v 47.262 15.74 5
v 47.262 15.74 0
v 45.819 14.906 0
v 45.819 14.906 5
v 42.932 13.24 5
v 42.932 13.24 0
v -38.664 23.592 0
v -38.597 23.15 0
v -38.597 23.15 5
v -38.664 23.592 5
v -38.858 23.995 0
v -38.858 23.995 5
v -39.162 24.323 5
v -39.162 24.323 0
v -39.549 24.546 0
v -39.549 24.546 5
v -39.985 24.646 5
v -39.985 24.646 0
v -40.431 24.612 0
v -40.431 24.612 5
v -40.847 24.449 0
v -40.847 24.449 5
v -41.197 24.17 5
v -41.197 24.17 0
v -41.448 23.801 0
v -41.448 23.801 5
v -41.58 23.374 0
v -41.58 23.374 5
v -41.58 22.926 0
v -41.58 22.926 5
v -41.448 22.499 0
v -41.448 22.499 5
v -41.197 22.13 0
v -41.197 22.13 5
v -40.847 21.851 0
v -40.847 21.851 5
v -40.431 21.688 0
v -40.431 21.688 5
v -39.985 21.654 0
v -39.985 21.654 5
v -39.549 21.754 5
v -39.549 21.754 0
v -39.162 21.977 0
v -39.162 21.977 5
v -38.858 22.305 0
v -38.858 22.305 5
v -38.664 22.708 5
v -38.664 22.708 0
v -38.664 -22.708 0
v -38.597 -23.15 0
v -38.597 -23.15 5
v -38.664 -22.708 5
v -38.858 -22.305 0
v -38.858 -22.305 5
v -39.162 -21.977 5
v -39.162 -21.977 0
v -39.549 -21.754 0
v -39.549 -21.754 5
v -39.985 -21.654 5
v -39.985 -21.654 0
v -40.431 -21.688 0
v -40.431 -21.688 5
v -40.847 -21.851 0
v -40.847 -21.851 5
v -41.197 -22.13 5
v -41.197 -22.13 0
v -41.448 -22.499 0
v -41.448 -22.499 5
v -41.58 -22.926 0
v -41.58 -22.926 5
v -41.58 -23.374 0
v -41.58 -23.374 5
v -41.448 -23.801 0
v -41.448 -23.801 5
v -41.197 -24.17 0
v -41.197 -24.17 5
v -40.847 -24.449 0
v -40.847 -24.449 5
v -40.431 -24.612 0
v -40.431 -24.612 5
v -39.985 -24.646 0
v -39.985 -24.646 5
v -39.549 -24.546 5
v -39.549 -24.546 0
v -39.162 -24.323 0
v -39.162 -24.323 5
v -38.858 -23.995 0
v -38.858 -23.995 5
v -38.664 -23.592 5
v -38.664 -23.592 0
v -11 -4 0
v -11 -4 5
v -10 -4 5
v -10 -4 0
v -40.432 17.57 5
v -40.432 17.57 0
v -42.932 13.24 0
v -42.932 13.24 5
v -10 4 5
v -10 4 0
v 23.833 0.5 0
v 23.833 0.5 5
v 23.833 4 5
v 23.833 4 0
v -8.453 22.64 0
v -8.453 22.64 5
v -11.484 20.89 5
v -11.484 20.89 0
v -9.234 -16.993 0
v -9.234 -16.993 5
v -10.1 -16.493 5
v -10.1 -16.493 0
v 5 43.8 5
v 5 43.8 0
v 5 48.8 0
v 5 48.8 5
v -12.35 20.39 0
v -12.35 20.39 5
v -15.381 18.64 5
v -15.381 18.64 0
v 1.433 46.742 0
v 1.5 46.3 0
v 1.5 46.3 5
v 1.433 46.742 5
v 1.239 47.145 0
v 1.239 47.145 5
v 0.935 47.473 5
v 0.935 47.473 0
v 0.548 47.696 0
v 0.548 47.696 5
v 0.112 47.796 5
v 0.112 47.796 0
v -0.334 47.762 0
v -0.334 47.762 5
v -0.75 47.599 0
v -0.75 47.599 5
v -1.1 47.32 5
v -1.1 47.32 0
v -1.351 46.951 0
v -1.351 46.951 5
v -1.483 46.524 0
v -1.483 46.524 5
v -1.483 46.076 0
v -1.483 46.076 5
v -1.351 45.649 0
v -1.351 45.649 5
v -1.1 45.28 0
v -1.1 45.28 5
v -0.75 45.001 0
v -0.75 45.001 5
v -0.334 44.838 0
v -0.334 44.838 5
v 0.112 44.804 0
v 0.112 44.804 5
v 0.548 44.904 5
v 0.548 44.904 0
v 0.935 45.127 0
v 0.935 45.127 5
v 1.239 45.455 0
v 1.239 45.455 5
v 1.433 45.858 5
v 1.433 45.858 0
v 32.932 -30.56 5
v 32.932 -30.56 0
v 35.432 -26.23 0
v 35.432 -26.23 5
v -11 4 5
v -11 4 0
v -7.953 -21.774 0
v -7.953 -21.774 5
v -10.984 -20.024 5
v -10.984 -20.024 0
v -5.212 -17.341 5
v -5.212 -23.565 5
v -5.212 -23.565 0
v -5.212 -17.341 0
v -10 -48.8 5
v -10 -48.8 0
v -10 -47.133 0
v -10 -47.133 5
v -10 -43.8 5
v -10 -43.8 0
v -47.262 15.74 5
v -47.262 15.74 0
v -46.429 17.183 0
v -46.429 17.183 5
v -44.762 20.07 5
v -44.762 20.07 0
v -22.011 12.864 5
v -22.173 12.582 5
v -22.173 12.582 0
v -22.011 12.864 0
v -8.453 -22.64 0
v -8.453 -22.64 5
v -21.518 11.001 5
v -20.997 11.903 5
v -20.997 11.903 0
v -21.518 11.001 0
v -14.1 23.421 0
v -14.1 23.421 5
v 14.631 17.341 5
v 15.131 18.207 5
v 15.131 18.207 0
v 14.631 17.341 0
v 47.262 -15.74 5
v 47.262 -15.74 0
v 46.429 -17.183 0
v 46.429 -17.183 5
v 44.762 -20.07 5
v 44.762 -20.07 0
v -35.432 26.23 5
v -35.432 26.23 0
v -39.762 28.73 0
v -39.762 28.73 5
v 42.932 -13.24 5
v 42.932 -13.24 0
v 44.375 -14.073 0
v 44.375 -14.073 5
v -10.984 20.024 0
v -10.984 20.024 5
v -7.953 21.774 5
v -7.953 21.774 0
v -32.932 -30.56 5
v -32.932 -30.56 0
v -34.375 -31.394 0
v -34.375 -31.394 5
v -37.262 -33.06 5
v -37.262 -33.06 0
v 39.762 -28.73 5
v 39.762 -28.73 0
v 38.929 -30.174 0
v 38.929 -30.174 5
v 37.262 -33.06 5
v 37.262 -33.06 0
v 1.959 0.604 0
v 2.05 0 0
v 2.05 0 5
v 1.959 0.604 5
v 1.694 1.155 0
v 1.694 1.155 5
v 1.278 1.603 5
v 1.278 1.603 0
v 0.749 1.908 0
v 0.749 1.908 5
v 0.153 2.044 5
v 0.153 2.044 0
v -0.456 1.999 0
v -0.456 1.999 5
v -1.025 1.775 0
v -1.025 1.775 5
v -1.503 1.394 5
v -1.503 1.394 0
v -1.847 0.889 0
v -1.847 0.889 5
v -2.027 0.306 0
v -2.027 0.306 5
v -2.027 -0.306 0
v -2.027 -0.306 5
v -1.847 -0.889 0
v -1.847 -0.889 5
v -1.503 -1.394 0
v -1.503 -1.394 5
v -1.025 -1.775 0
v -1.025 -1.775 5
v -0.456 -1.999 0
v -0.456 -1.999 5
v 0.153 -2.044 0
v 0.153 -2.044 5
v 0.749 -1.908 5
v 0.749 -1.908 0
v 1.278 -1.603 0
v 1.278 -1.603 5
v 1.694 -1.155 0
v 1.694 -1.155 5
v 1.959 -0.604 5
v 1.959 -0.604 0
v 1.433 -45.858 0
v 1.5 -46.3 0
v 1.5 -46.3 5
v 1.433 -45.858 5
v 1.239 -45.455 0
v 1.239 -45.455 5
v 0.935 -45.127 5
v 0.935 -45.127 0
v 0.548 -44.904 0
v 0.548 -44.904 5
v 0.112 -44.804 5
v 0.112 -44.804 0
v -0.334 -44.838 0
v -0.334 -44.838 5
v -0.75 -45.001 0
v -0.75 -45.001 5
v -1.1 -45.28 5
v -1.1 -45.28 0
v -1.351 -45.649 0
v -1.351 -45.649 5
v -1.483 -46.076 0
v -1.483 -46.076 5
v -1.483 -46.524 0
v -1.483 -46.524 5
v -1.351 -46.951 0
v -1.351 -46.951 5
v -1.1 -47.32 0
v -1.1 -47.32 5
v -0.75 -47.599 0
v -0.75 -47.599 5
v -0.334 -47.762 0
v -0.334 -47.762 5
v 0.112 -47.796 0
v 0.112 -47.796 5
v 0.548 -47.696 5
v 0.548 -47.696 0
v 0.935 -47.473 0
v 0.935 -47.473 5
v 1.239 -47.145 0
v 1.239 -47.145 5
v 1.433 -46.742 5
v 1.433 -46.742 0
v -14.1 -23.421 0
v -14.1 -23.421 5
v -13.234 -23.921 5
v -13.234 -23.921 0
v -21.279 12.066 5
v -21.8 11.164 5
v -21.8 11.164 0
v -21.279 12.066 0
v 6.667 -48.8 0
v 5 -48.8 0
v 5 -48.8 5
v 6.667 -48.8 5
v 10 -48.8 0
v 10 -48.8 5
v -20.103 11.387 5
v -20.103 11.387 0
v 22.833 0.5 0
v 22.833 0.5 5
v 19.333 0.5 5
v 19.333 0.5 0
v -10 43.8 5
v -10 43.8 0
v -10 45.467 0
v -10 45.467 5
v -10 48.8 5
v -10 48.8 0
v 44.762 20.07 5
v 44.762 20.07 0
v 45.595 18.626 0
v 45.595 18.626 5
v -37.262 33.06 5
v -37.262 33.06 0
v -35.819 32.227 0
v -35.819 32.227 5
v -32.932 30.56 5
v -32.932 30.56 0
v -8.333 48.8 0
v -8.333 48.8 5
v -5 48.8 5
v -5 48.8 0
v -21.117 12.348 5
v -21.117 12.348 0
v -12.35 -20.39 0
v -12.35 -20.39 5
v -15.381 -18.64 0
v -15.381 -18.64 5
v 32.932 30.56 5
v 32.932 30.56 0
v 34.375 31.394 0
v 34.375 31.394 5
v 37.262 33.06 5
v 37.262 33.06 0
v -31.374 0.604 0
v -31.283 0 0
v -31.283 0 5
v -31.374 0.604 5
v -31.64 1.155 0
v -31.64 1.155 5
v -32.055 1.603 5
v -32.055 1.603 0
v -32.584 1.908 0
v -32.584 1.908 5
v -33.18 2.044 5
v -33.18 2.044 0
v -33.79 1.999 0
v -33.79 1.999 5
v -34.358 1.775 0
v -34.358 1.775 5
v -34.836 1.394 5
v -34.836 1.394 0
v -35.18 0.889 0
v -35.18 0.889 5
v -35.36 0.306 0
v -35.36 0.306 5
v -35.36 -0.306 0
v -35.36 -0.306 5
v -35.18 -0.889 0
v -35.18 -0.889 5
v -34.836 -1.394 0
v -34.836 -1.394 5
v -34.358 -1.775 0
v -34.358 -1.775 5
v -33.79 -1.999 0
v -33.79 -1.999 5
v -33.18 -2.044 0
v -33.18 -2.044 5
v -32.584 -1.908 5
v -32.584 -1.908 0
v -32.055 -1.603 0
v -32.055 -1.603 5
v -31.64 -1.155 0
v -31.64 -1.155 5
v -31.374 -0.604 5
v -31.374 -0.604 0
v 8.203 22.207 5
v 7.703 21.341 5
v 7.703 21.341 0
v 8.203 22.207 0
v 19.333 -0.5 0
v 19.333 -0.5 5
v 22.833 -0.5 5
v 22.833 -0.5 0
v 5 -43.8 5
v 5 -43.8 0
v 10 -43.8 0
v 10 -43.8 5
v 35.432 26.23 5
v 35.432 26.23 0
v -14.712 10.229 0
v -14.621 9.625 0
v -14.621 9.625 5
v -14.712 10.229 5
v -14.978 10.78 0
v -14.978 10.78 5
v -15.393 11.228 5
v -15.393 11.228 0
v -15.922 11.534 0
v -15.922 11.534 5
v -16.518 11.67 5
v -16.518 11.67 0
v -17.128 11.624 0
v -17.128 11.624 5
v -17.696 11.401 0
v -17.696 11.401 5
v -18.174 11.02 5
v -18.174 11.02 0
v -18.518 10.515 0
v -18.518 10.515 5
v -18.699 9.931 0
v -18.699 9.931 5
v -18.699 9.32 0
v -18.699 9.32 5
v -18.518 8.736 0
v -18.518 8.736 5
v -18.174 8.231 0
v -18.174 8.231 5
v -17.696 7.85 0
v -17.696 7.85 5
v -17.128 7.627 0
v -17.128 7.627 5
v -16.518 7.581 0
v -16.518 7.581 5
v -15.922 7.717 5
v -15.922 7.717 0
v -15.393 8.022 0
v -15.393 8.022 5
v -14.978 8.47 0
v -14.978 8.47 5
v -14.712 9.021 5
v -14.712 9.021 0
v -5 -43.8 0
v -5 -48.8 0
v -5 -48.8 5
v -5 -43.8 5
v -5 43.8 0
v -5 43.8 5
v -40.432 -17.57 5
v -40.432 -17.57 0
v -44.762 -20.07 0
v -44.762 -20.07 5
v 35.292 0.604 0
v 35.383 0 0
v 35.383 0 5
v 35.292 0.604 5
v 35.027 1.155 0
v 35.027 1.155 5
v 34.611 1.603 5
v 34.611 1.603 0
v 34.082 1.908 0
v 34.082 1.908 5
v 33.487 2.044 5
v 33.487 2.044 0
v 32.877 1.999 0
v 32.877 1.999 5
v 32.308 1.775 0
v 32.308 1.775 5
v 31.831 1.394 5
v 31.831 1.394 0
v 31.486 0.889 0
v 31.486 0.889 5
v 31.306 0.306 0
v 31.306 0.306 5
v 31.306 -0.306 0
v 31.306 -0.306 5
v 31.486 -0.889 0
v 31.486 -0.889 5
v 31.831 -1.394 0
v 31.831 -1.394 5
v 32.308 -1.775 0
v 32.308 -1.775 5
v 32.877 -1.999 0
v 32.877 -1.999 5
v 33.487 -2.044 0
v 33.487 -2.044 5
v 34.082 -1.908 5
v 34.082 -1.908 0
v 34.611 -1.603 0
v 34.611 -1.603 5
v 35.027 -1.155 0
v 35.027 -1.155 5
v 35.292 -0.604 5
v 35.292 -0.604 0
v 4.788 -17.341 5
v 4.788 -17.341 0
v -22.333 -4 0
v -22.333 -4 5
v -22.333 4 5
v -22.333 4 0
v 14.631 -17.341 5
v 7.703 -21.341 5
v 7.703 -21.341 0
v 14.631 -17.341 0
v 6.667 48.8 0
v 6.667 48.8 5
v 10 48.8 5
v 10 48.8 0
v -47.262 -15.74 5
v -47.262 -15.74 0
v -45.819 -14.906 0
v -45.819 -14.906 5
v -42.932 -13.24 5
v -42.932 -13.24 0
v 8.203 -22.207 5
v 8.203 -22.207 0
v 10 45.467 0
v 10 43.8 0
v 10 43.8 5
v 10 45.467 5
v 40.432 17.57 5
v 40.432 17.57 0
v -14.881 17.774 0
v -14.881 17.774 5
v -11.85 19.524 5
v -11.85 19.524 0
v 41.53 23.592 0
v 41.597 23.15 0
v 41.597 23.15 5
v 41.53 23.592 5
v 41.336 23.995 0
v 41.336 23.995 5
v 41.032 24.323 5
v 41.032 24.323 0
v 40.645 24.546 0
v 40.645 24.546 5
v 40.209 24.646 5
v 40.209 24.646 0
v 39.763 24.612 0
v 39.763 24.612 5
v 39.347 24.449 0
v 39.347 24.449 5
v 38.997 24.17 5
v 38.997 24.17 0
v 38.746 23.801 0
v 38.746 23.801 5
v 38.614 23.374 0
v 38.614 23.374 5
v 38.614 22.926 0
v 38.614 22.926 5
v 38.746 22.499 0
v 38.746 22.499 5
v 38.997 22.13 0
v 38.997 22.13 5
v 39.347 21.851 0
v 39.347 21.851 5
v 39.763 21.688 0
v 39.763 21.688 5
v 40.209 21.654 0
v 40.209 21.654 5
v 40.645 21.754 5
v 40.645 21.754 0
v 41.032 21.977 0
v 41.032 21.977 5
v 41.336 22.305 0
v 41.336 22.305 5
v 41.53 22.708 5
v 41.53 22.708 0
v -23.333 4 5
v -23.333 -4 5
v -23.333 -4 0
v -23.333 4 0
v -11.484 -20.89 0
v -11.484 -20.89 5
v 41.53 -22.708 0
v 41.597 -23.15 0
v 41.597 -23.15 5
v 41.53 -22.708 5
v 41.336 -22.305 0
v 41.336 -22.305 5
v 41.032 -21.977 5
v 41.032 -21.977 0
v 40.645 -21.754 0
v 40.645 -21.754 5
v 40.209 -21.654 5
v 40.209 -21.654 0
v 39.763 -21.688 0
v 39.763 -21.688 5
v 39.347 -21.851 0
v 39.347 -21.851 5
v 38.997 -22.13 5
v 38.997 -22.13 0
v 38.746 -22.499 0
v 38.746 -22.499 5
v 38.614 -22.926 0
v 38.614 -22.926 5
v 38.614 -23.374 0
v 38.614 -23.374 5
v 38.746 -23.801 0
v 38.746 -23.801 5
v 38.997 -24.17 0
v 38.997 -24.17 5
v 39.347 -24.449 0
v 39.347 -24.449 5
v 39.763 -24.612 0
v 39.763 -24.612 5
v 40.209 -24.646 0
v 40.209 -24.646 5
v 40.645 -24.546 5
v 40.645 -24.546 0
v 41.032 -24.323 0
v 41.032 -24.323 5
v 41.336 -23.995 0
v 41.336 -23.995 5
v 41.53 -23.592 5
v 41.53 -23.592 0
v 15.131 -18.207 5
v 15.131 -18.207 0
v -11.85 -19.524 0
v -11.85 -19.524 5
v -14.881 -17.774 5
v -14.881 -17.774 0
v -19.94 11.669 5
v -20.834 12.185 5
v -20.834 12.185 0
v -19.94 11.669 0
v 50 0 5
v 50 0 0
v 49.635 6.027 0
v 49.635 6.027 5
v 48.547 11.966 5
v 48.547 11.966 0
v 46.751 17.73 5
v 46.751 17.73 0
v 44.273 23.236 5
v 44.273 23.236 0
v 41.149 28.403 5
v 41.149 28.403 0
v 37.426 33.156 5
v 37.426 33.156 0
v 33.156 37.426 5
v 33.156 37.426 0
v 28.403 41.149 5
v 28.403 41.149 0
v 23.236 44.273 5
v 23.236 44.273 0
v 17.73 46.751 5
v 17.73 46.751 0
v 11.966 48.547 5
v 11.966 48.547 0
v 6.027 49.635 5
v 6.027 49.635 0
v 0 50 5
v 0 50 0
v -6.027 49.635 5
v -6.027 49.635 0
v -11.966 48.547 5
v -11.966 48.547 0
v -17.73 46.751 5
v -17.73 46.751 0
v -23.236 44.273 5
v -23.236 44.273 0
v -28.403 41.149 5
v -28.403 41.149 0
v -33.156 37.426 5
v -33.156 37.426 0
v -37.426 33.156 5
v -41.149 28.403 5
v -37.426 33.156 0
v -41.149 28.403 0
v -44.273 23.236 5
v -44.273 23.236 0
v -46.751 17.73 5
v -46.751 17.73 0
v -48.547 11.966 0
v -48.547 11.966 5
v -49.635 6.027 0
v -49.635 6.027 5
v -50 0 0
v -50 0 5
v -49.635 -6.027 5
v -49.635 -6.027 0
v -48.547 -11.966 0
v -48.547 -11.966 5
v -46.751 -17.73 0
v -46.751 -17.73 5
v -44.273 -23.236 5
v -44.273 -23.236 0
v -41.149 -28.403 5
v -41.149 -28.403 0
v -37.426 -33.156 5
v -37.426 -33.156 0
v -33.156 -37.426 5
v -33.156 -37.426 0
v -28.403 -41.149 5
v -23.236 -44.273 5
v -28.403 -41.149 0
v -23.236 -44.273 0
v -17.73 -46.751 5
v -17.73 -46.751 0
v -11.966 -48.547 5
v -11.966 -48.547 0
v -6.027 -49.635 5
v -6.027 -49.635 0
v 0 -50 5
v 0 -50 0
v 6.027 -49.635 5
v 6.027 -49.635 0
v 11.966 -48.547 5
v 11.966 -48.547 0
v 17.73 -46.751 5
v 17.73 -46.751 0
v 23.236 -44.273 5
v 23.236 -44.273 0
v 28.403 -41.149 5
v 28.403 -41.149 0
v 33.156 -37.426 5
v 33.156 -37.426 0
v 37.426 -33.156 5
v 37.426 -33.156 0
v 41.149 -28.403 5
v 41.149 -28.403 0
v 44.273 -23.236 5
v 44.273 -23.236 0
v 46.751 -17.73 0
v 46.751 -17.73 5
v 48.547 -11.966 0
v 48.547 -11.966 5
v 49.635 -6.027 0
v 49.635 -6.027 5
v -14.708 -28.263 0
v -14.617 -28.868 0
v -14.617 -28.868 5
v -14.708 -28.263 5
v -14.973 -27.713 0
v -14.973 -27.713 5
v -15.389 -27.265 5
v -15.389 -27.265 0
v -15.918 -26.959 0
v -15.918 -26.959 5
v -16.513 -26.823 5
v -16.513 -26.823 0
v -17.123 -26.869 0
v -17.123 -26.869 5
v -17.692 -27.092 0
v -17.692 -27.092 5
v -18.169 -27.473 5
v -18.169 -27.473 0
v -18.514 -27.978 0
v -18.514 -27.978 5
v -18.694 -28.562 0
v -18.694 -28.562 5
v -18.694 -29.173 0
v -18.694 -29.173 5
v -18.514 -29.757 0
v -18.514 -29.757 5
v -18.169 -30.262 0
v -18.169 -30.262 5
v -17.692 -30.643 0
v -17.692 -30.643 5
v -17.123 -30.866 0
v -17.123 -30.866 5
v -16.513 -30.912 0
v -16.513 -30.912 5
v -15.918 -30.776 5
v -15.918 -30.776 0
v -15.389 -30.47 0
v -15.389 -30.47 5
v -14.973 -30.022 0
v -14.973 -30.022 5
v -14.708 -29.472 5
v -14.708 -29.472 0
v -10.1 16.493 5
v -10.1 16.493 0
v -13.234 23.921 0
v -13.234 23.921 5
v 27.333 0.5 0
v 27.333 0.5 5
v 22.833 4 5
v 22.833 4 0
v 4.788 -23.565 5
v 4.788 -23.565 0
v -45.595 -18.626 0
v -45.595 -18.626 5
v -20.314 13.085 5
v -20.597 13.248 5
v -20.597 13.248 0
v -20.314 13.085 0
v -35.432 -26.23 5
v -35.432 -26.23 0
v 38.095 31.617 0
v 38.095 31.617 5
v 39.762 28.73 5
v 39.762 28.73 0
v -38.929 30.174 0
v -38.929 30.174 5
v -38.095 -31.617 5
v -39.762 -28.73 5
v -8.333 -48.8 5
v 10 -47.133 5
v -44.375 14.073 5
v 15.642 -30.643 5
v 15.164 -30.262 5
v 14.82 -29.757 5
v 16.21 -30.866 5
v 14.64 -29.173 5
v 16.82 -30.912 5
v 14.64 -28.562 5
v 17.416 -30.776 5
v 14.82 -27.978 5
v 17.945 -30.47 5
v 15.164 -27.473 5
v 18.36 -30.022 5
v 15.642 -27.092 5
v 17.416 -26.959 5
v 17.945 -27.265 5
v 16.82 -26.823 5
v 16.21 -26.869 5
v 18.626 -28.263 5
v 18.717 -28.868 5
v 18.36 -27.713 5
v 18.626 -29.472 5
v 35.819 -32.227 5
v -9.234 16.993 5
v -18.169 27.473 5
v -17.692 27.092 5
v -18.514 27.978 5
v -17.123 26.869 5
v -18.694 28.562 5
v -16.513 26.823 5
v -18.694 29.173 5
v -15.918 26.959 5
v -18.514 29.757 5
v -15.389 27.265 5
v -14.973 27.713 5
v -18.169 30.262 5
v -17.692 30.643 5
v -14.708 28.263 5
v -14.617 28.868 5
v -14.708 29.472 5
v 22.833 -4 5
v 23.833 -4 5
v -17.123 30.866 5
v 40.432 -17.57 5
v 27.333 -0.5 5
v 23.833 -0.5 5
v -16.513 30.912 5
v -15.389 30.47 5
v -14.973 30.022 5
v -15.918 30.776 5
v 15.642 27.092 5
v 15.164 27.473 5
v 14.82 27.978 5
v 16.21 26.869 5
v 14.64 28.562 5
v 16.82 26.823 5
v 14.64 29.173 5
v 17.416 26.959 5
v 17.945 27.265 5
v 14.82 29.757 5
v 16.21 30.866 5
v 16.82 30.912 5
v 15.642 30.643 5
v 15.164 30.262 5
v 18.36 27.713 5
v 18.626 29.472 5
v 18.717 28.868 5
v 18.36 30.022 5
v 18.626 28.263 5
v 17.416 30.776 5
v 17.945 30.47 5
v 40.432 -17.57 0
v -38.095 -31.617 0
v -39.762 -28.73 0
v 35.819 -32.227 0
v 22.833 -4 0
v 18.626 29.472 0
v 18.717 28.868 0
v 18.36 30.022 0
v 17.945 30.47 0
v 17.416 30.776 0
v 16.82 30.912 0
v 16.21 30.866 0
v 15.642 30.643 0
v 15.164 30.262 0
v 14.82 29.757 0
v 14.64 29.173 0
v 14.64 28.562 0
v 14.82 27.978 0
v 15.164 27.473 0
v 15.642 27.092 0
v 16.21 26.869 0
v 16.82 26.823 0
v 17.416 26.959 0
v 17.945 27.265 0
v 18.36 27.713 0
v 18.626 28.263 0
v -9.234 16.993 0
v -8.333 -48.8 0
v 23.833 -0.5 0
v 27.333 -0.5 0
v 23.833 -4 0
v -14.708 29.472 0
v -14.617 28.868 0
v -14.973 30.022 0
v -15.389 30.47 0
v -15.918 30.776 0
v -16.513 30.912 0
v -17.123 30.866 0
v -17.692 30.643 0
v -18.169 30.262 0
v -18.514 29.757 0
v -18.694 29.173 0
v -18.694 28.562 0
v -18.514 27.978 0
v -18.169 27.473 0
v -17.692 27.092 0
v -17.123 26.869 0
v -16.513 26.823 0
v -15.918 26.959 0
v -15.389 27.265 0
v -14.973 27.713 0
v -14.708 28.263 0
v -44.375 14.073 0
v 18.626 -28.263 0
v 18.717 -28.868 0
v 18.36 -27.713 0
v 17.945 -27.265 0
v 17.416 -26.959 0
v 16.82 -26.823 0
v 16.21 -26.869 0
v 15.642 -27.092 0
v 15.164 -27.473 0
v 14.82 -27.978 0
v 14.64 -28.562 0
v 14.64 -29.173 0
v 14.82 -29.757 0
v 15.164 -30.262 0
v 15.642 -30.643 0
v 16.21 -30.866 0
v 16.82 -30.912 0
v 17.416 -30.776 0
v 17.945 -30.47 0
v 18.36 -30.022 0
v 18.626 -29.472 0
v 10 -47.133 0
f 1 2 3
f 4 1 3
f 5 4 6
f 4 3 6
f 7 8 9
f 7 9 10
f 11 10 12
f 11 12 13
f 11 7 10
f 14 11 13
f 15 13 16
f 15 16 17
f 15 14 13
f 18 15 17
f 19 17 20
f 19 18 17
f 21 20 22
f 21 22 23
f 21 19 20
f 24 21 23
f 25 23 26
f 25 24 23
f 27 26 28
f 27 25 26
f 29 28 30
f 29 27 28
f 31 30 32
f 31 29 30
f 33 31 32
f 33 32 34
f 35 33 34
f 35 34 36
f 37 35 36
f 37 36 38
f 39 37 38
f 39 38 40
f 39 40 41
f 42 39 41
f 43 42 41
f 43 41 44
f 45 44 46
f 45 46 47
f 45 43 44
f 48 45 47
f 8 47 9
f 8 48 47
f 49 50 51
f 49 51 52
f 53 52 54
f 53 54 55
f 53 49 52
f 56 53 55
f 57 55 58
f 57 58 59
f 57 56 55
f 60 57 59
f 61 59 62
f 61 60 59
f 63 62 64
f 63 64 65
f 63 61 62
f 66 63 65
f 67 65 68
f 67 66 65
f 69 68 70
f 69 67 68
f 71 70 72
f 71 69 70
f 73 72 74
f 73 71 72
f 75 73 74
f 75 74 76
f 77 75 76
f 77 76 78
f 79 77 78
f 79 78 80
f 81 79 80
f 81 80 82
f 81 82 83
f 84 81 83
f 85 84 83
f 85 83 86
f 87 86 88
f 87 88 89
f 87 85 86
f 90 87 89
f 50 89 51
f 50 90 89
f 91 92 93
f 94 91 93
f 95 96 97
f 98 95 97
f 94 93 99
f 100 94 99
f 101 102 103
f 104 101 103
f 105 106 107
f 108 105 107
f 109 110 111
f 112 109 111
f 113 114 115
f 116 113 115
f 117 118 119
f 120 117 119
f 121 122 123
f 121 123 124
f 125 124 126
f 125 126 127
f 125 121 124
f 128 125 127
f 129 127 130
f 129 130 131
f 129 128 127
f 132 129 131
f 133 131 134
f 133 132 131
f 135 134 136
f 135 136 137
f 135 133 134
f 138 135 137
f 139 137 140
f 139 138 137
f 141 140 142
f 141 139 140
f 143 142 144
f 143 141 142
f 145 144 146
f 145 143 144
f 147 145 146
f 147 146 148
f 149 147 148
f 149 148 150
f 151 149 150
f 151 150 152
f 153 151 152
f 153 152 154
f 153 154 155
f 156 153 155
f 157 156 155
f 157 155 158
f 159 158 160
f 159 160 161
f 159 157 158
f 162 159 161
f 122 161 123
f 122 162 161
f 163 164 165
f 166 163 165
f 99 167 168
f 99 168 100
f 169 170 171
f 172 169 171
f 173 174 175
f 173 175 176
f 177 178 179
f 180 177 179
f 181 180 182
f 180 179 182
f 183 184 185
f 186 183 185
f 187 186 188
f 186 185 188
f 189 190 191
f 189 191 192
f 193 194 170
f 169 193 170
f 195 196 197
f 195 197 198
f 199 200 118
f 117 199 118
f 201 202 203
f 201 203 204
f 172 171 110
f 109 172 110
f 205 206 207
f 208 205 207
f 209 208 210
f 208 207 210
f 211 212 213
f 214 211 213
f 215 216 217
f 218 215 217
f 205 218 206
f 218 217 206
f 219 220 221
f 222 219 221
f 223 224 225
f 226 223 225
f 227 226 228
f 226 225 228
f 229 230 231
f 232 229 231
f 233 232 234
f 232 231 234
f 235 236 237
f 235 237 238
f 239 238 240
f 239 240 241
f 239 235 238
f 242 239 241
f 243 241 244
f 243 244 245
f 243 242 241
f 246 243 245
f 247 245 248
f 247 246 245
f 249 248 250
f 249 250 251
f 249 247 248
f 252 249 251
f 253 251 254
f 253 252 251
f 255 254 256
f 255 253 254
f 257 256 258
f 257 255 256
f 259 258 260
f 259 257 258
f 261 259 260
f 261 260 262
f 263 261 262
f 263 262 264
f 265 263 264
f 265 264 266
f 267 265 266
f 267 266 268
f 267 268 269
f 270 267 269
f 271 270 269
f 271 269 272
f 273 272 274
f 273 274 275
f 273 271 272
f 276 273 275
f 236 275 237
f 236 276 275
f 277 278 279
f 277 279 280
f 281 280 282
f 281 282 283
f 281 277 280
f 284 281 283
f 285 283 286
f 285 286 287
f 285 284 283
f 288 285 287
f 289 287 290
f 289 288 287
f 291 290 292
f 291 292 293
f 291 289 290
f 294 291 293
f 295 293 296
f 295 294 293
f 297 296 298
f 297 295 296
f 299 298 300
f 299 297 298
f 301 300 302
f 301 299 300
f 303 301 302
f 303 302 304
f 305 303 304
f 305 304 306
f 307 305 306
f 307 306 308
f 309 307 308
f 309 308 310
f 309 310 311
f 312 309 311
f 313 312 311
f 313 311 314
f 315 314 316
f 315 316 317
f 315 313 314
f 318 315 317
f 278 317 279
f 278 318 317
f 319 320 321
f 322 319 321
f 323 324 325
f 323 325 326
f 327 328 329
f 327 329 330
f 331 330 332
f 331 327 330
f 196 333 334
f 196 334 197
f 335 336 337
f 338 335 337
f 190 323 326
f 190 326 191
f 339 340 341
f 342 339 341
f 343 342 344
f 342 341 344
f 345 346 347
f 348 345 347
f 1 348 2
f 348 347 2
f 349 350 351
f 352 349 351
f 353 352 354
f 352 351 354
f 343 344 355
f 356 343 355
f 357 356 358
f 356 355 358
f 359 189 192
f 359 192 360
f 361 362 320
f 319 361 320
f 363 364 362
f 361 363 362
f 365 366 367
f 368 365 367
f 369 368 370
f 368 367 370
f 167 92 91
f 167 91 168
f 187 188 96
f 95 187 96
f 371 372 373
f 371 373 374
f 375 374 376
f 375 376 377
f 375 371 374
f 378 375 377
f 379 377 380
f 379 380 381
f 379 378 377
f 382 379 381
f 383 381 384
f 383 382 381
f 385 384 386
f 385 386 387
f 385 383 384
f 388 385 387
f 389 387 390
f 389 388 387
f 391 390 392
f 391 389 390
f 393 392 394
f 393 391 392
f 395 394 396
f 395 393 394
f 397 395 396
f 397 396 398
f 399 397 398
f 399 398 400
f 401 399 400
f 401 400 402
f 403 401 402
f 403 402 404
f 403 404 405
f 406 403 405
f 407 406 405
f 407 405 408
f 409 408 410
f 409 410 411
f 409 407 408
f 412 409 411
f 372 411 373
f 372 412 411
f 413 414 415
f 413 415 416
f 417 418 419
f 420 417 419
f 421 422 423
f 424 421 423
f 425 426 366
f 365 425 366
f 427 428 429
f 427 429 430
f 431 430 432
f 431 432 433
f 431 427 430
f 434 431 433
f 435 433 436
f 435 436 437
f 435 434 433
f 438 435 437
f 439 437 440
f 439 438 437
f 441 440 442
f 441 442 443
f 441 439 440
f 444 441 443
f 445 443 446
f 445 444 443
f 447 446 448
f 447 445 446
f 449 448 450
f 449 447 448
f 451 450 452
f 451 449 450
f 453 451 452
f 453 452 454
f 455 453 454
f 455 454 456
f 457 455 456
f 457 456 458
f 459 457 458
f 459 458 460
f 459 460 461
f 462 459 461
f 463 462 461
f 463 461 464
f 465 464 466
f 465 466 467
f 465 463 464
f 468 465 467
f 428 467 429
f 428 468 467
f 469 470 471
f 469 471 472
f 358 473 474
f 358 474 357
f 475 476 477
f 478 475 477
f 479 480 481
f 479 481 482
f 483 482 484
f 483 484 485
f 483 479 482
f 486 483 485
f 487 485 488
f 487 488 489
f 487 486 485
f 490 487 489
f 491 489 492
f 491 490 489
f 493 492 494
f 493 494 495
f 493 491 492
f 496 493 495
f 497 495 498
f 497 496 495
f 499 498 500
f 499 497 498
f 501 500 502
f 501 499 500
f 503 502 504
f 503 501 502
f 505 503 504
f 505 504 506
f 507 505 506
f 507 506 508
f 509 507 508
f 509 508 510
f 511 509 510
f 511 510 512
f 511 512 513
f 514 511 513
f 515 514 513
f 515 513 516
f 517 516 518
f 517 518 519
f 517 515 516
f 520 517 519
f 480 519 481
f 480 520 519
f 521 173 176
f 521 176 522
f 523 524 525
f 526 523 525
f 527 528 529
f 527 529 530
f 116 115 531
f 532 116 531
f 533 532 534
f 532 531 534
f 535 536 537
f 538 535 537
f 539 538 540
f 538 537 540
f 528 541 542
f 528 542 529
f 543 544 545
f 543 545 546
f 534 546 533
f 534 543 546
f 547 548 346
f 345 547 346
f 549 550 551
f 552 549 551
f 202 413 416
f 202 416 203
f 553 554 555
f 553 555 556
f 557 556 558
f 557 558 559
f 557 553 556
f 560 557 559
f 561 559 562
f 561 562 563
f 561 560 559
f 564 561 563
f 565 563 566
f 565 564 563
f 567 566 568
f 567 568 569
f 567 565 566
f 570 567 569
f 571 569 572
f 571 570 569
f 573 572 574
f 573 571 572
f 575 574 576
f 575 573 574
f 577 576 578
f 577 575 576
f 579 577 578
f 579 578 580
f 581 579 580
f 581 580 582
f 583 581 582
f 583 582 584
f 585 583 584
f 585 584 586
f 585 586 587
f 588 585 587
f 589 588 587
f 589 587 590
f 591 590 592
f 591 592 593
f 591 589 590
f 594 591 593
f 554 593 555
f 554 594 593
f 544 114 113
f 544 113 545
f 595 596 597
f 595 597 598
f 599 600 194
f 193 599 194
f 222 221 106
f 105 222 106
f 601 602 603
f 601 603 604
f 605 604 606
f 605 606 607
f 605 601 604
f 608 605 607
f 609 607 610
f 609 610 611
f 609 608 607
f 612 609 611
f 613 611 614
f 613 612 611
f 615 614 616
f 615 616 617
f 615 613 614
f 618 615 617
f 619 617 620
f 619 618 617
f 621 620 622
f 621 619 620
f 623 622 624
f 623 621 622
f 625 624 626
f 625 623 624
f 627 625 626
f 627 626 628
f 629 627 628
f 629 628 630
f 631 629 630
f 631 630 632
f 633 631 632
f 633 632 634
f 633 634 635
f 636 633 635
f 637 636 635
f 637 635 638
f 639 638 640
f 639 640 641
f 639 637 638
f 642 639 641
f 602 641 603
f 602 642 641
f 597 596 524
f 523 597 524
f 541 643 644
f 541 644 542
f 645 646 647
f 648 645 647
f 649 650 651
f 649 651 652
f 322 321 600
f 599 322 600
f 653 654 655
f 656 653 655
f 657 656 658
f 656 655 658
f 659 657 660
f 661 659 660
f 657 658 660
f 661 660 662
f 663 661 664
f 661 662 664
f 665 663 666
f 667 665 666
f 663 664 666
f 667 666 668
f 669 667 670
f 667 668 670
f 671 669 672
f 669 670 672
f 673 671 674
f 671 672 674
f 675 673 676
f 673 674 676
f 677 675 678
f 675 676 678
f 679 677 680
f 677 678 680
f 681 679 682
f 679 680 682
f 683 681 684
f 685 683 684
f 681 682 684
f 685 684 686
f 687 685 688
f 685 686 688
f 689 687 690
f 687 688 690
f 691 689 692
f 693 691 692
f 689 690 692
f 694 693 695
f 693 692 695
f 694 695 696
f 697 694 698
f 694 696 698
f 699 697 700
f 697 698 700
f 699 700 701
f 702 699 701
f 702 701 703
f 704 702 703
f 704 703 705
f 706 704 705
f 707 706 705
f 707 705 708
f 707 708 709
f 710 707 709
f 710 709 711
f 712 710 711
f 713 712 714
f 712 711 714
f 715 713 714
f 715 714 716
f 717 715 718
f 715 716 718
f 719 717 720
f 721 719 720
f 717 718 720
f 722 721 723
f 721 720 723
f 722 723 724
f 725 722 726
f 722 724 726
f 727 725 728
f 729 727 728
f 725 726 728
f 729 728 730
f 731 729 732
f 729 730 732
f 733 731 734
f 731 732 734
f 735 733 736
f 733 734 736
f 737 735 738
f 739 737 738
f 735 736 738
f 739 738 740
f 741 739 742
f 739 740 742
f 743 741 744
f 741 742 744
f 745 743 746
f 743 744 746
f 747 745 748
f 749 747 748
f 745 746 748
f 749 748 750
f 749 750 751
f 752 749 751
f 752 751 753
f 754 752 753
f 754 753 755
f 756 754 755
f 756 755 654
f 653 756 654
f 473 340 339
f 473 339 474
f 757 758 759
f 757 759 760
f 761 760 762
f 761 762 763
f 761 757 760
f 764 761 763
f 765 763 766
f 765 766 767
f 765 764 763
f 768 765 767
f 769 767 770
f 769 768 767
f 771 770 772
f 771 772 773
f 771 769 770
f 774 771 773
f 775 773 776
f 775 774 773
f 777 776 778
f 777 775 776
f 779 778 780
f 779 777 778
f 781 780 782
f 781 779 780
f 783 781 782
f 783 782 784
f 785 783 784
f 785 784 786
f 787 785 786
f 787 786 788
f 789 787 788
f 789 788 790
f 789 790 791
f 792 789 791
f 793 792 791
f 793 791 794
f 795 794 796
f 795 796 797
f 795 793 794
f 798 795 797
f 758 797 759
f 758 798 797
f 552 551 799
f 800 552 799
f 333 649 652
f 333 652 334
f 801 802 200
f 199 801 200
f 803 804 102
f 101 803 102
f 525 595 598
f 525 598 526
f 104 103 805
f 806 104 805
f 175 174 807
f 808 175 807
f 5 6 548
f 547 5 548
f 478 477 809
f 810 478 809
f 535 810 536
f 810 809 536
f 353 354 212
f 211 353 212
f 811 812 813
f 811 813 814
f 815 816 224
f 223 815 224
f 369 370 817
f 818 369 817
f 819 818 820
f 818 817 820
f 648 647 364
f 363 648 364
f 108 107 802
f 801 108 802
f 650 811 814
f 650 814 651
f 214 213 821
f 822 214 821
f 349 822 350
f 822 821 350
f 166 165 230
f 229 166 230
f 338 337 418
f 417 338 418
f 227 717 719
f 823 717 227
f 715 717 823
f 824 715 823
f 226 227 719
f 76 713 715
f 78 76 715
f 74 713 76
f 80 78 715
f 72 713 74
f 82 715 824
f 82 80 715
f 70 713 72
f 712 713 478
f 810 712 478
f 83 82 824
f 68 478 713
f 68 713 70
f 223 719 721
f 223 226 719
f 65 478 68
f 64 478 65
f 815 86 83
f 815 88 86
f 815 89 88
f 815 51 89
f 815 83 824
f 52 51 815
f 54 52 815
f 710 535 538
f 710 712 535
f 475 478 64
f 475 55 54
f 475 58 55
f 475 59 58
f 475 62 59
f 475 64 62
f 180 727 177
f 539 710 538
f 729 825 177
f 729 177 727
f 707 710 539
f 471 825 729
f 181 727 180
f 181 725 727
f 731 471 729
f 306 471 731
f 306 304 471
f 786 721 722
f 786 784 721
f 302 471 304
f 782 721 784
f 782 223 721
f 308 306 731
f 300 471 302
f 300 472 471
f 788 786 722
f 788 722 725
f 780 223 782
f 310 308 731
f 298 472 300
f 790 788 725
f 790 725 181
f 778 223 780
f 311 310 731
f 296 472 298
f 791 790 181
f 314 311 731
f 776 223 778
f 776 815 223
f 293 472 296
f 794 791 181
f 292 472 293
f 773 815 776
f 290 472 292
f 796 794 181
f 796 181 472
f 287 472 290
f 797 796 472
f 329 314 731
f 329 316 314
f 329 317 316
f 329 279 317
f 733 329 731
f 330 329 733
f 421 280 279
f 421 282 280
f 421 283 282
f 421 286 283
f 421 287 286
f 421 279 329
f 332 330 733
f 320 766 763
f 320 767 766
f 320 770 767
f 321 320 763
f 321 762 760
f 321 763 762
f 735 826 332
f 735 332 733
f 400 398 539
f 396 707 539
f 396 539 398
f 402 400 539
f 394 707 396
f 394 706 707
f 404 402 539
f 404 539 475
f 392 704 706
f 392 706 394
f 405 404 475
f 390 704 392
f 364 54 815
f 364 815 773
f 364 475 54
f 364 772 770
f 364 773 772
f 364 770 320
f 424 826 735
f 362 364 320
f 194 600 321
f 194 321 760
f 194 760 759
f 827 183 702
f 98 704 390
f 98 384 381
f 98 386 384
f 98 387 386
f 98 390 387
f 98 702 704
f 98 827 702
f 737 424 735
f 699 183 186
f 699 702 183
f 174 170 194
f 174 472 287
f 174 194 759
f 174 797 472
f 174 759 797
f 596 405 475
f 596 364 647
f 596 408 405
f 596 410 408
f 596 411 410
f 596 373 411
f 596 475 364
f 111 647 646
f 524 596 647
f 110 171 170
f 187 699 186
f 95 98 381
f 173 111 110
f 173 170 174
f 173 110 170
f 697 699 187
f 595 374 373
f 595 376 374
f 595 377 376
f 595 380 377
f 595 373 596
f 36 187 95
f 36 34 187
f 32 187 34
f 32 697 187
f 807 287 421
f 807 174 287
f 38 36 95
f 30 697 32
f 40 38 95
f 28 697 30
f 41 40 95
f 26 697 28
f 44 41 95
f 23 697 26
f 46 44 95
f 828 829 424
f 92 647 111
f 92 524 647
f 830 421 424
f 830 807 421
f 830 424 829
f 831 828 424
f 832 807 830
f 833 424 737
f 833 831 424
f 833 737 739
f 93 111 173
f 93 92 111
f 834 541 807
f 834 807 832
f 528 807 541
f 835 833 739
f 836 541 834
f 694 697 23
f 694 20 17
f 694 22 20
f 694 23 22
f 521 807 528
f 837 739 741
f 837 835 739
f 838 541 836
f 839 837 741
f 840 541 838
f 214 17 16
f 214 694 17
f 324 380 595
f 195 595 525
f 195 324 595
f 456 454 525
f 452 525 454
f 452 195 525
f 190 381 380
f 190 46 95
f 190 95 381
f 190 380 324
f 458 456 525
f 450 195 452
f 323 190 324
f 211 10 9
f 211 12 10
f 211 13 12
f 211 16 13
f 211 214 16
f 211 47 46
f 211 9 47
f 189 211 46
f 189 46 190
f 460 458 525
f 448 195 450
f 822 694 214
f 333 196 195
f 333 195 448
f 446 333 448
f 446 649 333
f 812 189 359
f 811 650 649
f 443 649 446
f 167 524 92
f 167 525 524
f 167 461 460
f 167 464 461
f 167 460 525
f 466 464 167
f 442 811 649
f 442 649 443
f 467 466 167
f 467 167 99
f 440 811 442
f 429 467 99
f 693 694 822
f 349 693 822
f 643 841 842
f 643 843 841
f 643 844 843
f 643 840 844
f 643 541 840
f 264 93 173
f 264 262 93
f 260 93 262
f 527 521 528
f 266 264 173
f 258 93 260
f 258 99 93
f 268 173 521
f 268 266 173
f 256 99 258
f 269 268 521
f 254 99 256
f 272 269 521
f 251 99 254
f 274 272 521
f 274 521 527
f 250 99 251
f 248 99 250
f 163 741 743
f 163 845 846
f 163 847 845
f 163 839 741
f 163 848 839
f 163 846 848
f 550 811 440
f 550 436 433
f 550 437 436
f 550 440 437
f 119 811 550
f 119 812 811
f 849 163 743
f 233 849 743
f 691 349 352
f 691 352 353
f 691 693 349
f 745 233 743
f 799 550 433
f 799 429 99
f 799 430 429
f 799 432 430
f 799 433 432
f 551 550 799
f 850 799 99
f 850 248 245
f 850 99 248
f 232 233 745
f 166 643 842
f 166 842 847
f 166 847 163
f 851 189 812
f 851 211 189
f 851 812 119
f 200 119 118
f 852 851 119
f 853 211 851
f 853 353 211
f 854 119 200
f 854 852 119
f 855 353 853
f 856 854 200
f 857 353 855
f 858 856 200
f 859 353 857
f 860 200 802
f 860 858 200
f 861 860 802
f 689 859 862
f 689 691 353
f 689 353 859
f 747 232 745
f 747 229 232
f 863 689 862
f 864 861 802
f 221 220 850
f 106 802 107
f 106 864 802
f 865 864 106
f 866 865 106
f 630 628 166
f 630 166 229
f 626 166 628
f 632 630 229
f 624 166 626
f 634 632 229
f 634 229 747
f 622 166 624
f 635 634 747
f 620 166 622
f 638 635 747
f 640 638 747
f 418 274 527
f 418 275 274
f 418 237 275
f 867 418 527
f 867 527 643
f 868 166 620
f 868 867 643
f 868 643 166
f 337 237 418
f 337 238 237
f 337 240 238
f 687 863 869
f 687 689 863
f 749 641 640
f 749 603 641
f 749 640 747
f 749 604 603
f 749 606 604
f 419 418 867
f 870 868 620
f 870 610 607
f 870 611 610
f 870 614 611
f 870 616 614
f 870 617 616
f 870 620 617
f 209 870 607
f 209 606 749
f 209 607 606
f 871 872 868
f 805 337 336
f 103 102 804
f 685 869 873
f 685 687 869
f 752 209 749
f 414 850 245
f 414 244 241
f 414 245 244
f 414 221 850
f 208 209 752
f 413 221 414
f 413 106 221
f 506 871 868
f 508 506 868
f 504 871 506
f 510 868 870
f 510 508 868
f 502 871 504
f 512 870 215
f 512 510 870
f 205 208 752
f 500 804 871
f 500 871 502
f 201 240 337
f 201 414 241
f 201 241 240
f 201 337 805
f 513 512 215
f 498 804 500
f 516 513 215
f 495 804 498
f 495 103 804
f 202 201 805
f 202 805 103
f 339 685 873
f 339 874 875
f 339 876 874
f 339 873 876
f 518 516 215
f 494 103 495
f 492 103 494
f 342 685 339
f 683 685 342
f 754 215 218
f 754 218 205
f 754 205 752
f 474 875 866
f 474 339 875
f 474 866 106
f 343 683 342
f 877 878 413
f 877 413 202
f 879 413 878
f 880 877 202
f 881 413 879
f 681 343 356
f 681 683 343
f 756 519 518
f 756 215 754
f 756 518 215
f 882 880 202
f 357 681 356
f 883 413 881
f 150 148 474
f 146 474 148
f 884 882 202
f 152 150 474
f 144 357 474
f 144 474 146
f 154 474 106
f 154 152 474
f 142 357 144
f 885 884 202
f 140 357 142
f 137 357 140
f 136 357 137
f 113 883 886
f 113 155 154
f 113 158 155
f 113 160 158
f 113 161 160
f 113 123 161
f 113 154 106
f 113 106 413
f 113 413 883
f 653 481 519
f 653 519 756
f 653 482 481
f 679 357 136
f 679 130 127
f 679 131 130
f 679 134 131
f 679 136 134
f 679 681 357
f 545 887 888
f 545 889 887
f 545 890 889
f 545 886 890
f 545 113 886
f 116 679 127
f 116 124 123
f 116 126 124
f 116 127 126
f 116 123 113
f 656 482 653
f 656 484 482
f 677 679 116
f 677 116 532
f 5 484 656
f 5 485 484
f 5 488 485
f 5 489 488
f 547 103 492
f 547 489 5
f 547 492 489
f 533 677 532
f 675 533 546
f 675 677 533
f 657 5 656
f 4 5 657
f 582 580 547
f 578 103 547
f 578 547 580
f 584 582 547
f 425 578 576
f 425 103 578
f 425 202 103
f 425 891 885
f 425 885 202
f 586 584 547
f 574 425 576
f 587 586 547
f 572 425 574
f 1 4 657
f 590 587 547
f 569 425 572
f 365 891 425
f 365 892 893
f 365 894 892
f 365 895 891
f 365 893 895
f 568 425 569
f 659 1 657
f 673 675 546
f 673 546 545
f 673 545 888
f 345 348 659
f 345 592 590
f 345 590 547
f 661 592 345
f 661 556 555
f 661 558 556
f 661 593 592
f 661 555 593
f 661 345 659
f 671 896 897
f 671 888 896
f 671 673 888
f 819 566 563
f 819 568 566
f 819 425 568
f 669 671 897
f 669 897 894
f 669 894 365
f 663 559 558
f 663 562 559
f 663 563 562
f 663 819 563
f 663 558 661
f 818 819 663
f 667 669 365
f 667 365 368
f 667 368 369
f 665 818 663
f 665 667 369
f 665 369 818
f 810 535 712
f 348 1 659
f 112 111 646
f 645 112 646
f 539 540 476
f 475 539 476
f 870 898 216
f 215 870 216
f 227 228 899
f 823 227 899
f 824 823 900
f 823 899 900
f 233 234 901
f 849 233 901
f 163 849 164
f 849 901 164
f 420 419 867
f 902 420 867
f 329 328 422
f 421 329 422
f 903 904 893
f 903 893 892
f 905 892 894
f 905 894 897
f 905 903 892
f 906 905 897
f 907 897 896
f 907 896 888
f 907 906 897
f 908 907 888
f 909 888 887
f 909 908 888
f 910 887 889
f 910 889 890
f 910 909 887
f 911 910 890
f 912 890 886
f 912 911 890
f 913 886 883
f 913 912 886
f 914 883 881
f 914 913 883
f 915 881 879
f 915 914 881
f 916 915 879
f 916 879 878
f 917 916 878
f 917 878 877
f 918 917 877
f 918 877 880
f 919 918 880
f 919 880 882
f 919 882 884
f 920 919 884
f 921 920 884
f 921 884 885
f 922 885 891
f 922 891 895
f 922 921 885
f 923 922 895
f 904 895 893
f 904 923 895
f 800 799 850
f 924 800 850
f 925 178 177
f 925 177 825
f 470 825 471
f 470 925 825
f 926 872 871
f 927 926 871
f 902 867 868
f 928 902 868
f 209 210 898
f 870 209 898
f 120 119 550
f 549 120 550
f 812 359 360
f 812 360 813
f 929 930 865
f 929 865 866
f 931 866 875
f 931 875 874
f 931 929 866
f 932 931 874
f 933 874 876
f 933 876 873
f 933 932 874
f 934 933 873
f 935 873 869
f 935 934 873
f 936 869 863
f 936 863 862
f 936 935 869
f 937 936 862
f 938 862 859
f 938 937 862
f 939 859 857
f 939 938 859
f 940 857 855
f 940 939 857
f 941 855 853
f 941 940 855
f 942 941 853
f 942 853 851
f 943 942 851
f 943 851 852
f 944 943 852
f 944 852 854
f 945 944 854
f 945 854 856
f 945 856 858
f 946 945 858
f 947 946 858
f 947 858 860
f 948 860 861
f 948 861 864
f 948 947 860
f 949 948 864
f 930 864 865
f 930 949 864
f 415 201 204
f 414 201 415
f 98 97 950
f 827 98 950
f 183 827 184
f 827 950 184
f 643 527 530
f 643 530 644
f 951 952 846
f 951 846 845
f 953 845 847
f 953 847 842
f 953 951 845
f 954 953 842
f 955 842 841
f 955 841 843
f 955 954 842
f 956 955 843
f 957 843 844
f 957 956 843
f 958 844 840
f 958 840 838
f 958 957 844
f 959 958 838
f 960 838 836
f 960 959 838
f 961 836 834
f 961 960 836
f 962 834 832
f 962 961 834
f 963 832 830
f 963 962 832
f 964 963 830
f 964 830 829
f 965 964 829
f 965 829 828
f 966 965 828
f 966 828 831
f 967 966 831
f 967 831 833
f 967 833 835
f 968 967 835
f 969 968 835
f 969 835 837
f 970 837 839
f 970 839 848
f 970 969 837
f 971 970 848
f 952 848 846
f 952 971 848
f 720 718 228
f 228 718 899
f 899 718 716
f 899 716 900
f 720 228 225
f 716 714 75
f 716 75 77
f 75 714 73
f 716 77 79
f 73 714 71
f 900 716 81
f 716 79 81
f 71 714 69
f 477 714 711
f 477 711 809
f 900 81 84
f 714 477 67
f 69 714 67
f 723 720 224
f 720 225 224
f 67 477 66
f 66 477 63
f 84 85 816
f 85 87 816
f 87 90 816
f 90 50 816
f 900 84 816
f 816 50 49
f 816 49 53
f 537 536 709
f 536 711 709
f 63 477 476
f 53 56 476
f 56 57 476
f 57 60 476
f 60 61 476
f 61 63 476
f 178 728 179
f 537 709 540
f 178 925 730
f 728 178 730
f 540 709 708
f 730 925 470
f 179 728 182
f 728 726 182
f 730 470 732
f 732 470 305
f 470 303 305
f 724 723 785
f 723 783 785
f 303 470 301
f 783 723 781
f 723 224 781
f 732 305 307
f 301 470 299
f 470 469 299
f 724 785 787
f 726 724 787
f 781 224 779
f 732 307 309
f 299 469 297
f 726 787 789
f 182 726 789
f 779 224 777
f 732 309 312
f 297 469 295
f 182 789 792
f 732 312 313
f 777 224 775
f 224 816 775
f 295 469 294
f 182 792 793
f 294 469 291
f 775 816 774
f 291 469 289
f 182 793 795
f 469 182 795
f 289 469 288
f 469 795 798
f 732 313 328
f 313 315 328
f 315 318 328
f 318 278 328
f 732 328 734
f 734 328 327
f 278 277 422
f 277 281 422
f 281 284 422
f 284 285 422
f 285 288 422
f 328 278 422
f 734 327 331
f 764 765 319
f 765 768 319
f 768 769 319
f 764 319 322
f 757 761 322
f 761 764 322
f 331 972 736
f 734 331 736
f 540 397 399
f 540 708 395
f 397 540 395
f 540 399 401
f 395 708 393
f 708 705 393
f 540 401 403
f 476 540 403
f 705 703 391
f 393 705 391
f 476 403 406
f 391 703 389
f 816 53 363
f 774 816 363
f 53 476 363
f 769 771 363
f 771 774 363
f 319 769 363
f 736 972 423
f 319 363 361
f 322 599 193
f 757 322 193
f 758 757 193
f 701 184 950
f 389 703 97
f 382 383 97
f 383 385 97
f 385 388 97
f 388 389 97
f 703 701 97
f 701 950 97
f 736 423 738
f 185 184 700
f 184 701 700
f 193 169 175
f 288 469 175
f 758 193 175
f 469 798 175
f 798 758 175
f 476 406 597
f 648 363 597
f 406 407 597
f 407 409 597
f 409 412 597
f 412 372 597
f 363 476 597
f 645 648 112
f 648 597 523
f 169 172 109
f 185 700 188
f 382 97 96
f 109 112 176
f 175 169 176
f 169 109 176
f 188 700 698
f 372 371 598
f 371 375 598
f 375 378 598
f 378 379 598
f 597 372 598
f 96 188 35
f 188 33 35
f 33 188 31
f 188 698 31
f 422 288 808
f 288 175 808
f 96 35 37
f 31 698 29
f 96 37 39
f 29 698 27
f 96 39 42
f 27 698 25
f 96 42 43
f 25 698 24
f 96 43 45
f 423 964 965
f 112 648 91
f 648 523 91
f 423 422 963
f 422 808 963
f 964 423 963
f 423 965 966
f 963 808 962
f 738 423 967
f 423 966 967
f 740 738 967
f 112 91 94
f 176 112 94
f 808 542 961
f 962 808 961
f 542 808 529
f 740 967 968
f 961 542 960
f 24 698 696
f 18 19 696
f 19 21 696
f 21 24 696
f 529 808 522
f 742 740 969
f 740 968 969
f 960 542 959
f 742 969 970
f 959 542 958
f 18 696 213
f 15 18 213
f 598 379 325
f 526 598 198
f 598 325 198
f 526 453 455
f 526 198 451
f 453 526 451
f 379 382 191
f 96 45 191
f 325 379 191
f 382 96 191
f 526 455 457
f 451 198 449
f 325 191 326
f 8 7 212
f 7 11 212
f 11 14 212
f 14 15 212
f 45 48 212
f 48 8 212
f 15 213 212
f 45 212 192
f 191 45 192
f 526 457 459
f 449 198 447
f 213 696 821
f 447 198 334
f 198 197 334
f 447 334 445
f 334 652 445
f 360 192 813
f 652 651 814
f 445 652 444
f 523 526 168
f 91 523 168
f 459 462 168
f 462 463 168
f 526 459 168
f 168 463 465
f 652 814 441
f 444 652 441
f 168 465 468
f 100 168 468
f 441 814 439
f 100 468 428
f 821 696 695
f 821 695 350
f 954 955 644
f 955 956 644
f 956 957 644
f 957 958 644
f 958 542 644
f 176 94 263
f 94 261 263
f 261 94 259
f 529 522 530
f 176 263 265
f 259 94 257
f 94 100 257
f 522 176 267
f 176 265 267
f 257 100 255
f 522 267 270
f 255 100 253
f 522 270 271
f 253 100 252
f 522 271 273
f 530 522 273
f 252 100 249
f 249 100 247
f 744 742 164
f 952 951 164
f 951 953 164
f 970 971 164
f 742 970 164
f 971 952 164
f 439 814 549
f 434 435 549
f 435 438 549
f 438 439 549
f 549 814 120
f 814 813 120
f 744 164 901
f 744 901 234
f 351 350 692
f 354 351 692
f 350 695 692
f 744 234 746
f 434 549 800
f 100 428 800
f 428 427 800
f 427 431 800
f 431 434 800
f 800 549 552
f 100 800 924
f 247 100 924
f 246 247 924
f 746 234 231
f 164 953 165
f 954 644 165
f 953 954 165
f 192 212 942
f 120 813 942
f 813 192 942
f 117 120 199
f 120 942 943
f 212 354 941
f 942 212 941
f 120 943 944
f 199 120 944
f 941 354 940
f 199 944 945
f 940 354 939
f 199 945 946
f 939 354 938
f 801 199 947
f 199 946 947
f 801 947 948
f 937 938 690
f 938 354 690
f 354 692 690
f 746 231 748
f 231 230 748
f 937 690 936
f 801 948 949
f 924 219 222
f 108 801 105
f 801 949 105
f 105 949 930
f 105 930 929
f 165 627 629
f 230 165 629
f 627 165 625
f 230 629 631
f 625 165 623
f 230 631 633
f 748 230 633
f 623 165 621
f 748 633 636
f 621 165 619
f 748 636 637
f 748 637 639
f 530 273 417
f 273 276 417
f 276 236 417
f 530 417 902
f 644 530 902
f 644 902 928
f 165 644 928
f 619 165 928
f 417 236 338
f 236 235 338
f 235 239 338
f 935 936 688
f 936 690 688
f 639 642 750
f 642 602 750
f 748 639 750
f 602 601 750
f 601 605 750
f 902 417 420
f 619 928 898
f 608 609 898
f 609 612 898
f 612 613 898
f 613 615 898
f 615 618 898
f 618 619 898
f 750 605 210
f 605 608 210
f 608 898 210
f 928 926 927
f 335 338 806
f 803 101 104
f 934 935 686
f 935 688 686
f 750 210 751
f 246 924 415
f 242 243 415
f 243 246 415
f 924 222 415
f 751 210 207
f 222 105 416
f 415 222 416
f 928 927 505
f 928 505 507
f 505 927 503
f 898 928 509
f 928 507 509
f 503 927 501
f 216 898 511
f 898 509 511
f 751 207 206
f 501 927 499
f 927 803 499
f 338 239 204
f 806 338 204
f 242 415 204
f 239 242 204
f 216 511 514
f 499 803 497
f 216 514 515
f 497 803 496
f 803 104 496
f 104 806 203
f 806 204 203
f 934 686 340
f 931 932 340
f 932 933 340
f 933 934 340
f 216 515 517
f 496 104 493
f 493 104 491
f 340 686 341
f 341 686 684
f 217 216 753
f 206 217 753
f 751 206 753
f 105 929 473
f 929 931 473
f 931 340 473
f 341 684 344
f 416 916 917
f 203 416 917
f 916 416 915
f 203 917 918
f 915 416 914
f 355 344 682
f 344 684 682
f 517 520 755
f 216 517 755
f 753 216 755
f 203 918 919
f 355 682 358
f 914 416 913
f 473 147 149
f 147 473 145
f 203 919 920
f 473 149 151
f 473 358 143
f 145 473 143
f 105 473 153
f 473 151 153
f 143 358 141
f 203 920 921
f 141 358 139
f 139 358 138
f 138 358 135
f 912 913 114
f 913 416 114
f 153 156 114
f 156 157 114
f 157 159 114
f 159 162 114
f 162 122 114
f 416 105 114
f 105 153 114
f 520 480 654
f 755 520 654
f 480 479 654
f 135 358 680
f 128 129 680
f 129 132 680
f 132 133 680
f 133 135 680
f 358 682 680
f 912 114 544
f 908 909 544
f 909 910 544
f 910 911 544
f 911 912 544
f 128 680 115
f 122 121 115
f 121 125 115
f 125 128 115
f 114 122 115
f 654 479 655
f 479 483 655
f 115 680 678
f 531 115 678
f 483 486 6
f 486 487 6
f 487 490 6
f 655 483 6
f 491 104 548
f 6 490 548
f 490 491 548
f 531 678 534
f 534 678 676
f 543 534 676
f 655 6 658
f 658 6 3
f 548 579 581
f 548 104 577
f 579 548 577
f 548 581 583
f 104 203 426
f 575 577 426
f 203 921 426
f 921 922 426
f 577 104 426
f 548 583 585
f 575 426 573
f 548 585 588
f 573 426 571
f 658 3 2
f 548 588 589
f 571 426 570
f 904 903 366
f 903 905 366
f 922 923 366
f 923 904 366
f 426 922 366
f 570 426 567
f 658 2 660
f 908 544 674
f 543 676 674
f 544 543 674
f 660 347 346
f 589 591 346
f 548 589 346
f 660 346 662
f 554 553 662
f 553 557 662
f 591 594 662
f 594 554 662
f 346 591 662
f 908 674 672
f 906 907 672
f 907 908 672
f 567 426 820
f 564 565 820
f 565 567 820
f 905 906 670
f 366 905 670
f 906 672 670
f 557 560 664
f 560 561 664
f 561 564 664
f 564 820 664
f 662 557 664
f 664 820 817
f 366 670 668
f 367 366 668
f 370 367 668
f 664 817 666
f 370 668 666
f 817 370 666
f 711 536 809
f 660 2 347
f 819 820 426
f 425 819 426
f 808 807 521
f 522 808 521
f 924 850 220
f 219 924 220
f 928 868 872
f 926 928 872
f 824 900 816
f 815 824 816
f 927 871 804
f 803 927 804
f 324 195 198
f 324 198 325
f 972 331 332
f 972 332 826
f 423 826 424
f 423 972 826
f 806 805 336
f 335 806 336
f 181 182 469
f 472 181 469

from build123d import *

# Parameters (mm, degrees)
BOSS_EXTRU_1_OUTLINE_R   = 50
BOSS_EXTRU_1_OUTLINE_W   = 5
BOSS_EXTRU_1_OUTLINE_H   = 5
BOSS_EXTRU_1_OUTLINE_R_2 = 2.05
BOSS_EXTRU_1_OUTLINE_R_3 = 1.5
BOSS_EXTRU_1_DEPTH       = 5
SKETCH3_W                = 1
SKETCH3_H                = 8
SKETCH3_W_2              = 10
SKETCH3_H_2              = 6.223903135
CUT_EXTRUDE2_DEPTH       = 10


# Read off the part's stored shape, not the designer's step: Boss.-Extru.1
with BuildPart() as part:
    # Boss.-Extru.1 outline → Boss.-Extru.1 (new body)
    with BuildSketch(Plane.XY):
        Circle(BOSS_EXTRU_1_OUTLINE_R)
        Polygon((-37.262039705, -33.060254038), (-39.762039705, -28.730127019), (-35.431912686, -26.230127019), (-32.931912686, -30.560254038), align=None, mode=Mode.SUBTRACT)
        with Locations((-7.5, -46.3)):
            Rectangle(BOSS_EXTRU_1_OUTLINE_W, BOSS_EXTRU_1_OUTLINE_H, mode=Mode.SUBTRACT)
        with Locations((-16.666666667, -28.867513459)):
            Circle(BOSS_EXTRU_1_OUTLINE_R_2, mode=Mode.SUBTRACT)
        with Locations((-40.096976195, -23.15)):
            Circle(BOSS_EXTRU_1_OUTLINE_R_3, mode=Mode.SUBTRACT)
        Polygon((-42.931912686, -13.239745962), (-40.431912686, -17.569872981), (-44.762039705, -20.069872981), (-47.262039705, -15.739745962), align=None, mode=Mode.SUBTRACT)
        with Locations((0, -46.3)):
            Circle(BOSS_EXTRU_1_OUTLINE_R_3, mode=Mode.SUBTRACT)
        with Locations((7.5, -46.3)):
            Rectangle(BOSS_EXTRU_1_OUTLINE_W, BOSS_EXTRU_1_OUTLINE_H, mode=Mode.SUBTRACT)
        with Locations((16.666666667, -28.867513459)):
            Circle(BOSS_EXTRU_1_OUTLINE_R_2, mode=Mode.SUBTRACT)
        Polygon((32.931912686, -30.560254038), (35.431912686, -26.230127019), (39.762039705, -28.730127019), (37.262039705, -33.060254038), align=None, mode=Mode.SUBTRACT)
        with Locations((40.096976195, -23.15)):
            Circle(BOSS_EXTRU_1_OUTLINE_R_3, mode=Mode.SUBTRACT)
        Polygon((47.262039705, -15.739745962), (44.762039705, -20.069872981), (40.431912686, -17.569872981), (42.931912686, -13.239745962), align=None, mode=Mode.SUBTRACT)
        with Locations((-33.333333333, 0)):
            Circle(BOSS_EXTRU_1_OUTLINE_R_2, mode=Mode.SUBTRACT)
        Polygon((-47.262039705, 15.739745962), (-44.762039705, 20.069872981), (-40.431912686, 17.569872981), (-42.931912686, 13.239745962), align=None, mode=Mode.SUBTRACT)
        with Locations((-40.096976195, 23.15)):
            Circle(BOSS_EXTRU_1_OUTLINE_R_3, mode=Mode.SUBTRACT)
        with Locations((-16.671397032, 9.625235564)):
            Circle(BOSS_EXTRU_1_OUTLINE_R_2, mode=Mode.SUBTRACT)
        Polygon((-32.931912686, 30.560254038), (-35.431912686, 26.230127019), (-39.762039705, 28.730127019), (-37.262039705, 33.060254038), align=None, mode=Mode.SUBTRACT)
        with Locations((-16.666666667, 28.867513459)):
            Circle(BOSS_EXTRU_1_OUTLINE_R_2, mode=Mode.SUBTRACT)
        with Locations((-7.5, 46.3)):
            Rectangle(BOSS_EXTRU_1_OUTLINE_W, BOSS_EXTRU_1_OUTLINE_H, mode=Mode.SUBTRACT)
        Circle(BOSS_EXTRU_1_OUTLINE_R_2, mode=Mode.SUBTRACT)
        with Locations((33.333333333, 0)):
            Circle(BOSS_EXTRU_1_OUTLINE_R_2, mode=Mode.SUBTRACT)
        Polygon((42.931912686, 13.239745962), (40.431912686, 17.569872981), (44.762039705, 20.069872981), (47.262039705, 15.739745962), align=None, mode=Mode.SUBTRACT)
        with Locations((40.096976195, 23.15)):
            Circle(BOSS_EXTRU_1_OUTLINE_R_3, mode=Mode.SUBTRACT)
        with Locations((16.666666667, 28.867513459)):
            Circle(BOSS_EXTRU_1_OUTLINE_R_2, mode=Mode.SUBTRACT)
        with Locations((0, 46.3)):
            Circle(BOSS_EXTRU_1_OUTLINE_R_3, mode=Mode.SUBTRACT)
        with Locations((7.5, 46.3)):
            Rectangle(BOSS_EXTRU_1_OUTLINE_W, BOSS_EXTRU_1_OUTLINE_H, mode=Mode.SUBTRACT)
        Polygon((37.262039705, 33.060254038), (39.762039705, 28.730127019), (35.431912686, 26.230127019), (32.931912686, 30.560254038), align=None, mode=Mode.SUBTRACT)
    extrude(amount=BOSS_EXTRU_1_DEPTH)

    # Sketch3 → Cut-Extrude2 (cut)
    with BuildSketch(Plane.XY.offset(5)):
        with Locations((-10.5, 0)):
            Rectangle(SKETCH3_W, SKETCH3_H)
        with Locations((-22.833333333, 0)):
            Rectangle(SKETCH3_W, SKETCH3_H)
        Polygon((-13.233653965, 23.921361037), (-14.099679369, 23.421361037), (-12.349679369, 20.390272124), (-15.380768282, 18.640272124), (-14.880768282, 17.77424672), (-11.849679369, 19.52424672), (-10.099679369, 16.493157806), (-9.233653965, 16.993157806), (-10.983653965, 20.02424672), (-7.952565052, 21.77424672), (-8.452565052, 22.640272124), (-11.483653965, 20.890272124), align=None)
        Polygon((15.130768282, 18.207259422), (14.630768282, 17.341234018), (7.702565052, 21.341234018), (8.202565052, 22.207259422), align=None)
        Polygon((8.202565052, -22.207259422), (7.702565052, -21.341234018), (14.630768282, -17.341234018), (15.130768282, -18.207259422), align=None)
        Polygon((27.333333333, -0.5), (27.333333333, 0.5), (23.833333333, 0.5), (23.833333333, 4), (22.833333333, 4), (22.833333333, 0.5), (19.333333333, 0.5), (19.333333333, -0.5), (22.833333333, -0.5), (22.833333333, -4), (23.833333333, -4), (23.833333333, -0.5), align=None)
        Polygon((-14.099679369, -23.421361037), (-13.233653965, -23.921361037), (-11.483653965, -20.890272124), (-8.452565052, -22.640272124), (-7.952565052, -21.77424672), (-10.983653965, -20.02424672), (-9.233653965, -16.993157806), (-10.099679369, -16.493157806), (-11.849679369, -19.52424672), (-14.880768282, -17.77424672), (-15.380768282, -18.640272124), (-12.349679369, -20.390272124), align=None)
        with Locations((-0.211745945, -20.453185586)):
            Rectangle(SKETCH3_W_2, SKETCH3_H_2)
        Polygon((-20.834234776, 12.184801987), (-19.940304487, 11.668776346), (-20.102964744, 11.386925384), (-20.996895032, 11.902951025), (-21.517828526, 11.000607275), (-21.800380609, 11.163968654), (-21.279447115, 12.066312404), (-22.173377404, 12.582338045), (-22.010717147, 12.864189006), (-21.116786859, 12.348163365), (-20.596554487, 13.24840375), (-20.314002404, 13.085042371), align=None)
    extrude(amount=-CUT_EXTRUDE2_DEPTH, mode=Mode.SUBTRACT)


solid = part.part
